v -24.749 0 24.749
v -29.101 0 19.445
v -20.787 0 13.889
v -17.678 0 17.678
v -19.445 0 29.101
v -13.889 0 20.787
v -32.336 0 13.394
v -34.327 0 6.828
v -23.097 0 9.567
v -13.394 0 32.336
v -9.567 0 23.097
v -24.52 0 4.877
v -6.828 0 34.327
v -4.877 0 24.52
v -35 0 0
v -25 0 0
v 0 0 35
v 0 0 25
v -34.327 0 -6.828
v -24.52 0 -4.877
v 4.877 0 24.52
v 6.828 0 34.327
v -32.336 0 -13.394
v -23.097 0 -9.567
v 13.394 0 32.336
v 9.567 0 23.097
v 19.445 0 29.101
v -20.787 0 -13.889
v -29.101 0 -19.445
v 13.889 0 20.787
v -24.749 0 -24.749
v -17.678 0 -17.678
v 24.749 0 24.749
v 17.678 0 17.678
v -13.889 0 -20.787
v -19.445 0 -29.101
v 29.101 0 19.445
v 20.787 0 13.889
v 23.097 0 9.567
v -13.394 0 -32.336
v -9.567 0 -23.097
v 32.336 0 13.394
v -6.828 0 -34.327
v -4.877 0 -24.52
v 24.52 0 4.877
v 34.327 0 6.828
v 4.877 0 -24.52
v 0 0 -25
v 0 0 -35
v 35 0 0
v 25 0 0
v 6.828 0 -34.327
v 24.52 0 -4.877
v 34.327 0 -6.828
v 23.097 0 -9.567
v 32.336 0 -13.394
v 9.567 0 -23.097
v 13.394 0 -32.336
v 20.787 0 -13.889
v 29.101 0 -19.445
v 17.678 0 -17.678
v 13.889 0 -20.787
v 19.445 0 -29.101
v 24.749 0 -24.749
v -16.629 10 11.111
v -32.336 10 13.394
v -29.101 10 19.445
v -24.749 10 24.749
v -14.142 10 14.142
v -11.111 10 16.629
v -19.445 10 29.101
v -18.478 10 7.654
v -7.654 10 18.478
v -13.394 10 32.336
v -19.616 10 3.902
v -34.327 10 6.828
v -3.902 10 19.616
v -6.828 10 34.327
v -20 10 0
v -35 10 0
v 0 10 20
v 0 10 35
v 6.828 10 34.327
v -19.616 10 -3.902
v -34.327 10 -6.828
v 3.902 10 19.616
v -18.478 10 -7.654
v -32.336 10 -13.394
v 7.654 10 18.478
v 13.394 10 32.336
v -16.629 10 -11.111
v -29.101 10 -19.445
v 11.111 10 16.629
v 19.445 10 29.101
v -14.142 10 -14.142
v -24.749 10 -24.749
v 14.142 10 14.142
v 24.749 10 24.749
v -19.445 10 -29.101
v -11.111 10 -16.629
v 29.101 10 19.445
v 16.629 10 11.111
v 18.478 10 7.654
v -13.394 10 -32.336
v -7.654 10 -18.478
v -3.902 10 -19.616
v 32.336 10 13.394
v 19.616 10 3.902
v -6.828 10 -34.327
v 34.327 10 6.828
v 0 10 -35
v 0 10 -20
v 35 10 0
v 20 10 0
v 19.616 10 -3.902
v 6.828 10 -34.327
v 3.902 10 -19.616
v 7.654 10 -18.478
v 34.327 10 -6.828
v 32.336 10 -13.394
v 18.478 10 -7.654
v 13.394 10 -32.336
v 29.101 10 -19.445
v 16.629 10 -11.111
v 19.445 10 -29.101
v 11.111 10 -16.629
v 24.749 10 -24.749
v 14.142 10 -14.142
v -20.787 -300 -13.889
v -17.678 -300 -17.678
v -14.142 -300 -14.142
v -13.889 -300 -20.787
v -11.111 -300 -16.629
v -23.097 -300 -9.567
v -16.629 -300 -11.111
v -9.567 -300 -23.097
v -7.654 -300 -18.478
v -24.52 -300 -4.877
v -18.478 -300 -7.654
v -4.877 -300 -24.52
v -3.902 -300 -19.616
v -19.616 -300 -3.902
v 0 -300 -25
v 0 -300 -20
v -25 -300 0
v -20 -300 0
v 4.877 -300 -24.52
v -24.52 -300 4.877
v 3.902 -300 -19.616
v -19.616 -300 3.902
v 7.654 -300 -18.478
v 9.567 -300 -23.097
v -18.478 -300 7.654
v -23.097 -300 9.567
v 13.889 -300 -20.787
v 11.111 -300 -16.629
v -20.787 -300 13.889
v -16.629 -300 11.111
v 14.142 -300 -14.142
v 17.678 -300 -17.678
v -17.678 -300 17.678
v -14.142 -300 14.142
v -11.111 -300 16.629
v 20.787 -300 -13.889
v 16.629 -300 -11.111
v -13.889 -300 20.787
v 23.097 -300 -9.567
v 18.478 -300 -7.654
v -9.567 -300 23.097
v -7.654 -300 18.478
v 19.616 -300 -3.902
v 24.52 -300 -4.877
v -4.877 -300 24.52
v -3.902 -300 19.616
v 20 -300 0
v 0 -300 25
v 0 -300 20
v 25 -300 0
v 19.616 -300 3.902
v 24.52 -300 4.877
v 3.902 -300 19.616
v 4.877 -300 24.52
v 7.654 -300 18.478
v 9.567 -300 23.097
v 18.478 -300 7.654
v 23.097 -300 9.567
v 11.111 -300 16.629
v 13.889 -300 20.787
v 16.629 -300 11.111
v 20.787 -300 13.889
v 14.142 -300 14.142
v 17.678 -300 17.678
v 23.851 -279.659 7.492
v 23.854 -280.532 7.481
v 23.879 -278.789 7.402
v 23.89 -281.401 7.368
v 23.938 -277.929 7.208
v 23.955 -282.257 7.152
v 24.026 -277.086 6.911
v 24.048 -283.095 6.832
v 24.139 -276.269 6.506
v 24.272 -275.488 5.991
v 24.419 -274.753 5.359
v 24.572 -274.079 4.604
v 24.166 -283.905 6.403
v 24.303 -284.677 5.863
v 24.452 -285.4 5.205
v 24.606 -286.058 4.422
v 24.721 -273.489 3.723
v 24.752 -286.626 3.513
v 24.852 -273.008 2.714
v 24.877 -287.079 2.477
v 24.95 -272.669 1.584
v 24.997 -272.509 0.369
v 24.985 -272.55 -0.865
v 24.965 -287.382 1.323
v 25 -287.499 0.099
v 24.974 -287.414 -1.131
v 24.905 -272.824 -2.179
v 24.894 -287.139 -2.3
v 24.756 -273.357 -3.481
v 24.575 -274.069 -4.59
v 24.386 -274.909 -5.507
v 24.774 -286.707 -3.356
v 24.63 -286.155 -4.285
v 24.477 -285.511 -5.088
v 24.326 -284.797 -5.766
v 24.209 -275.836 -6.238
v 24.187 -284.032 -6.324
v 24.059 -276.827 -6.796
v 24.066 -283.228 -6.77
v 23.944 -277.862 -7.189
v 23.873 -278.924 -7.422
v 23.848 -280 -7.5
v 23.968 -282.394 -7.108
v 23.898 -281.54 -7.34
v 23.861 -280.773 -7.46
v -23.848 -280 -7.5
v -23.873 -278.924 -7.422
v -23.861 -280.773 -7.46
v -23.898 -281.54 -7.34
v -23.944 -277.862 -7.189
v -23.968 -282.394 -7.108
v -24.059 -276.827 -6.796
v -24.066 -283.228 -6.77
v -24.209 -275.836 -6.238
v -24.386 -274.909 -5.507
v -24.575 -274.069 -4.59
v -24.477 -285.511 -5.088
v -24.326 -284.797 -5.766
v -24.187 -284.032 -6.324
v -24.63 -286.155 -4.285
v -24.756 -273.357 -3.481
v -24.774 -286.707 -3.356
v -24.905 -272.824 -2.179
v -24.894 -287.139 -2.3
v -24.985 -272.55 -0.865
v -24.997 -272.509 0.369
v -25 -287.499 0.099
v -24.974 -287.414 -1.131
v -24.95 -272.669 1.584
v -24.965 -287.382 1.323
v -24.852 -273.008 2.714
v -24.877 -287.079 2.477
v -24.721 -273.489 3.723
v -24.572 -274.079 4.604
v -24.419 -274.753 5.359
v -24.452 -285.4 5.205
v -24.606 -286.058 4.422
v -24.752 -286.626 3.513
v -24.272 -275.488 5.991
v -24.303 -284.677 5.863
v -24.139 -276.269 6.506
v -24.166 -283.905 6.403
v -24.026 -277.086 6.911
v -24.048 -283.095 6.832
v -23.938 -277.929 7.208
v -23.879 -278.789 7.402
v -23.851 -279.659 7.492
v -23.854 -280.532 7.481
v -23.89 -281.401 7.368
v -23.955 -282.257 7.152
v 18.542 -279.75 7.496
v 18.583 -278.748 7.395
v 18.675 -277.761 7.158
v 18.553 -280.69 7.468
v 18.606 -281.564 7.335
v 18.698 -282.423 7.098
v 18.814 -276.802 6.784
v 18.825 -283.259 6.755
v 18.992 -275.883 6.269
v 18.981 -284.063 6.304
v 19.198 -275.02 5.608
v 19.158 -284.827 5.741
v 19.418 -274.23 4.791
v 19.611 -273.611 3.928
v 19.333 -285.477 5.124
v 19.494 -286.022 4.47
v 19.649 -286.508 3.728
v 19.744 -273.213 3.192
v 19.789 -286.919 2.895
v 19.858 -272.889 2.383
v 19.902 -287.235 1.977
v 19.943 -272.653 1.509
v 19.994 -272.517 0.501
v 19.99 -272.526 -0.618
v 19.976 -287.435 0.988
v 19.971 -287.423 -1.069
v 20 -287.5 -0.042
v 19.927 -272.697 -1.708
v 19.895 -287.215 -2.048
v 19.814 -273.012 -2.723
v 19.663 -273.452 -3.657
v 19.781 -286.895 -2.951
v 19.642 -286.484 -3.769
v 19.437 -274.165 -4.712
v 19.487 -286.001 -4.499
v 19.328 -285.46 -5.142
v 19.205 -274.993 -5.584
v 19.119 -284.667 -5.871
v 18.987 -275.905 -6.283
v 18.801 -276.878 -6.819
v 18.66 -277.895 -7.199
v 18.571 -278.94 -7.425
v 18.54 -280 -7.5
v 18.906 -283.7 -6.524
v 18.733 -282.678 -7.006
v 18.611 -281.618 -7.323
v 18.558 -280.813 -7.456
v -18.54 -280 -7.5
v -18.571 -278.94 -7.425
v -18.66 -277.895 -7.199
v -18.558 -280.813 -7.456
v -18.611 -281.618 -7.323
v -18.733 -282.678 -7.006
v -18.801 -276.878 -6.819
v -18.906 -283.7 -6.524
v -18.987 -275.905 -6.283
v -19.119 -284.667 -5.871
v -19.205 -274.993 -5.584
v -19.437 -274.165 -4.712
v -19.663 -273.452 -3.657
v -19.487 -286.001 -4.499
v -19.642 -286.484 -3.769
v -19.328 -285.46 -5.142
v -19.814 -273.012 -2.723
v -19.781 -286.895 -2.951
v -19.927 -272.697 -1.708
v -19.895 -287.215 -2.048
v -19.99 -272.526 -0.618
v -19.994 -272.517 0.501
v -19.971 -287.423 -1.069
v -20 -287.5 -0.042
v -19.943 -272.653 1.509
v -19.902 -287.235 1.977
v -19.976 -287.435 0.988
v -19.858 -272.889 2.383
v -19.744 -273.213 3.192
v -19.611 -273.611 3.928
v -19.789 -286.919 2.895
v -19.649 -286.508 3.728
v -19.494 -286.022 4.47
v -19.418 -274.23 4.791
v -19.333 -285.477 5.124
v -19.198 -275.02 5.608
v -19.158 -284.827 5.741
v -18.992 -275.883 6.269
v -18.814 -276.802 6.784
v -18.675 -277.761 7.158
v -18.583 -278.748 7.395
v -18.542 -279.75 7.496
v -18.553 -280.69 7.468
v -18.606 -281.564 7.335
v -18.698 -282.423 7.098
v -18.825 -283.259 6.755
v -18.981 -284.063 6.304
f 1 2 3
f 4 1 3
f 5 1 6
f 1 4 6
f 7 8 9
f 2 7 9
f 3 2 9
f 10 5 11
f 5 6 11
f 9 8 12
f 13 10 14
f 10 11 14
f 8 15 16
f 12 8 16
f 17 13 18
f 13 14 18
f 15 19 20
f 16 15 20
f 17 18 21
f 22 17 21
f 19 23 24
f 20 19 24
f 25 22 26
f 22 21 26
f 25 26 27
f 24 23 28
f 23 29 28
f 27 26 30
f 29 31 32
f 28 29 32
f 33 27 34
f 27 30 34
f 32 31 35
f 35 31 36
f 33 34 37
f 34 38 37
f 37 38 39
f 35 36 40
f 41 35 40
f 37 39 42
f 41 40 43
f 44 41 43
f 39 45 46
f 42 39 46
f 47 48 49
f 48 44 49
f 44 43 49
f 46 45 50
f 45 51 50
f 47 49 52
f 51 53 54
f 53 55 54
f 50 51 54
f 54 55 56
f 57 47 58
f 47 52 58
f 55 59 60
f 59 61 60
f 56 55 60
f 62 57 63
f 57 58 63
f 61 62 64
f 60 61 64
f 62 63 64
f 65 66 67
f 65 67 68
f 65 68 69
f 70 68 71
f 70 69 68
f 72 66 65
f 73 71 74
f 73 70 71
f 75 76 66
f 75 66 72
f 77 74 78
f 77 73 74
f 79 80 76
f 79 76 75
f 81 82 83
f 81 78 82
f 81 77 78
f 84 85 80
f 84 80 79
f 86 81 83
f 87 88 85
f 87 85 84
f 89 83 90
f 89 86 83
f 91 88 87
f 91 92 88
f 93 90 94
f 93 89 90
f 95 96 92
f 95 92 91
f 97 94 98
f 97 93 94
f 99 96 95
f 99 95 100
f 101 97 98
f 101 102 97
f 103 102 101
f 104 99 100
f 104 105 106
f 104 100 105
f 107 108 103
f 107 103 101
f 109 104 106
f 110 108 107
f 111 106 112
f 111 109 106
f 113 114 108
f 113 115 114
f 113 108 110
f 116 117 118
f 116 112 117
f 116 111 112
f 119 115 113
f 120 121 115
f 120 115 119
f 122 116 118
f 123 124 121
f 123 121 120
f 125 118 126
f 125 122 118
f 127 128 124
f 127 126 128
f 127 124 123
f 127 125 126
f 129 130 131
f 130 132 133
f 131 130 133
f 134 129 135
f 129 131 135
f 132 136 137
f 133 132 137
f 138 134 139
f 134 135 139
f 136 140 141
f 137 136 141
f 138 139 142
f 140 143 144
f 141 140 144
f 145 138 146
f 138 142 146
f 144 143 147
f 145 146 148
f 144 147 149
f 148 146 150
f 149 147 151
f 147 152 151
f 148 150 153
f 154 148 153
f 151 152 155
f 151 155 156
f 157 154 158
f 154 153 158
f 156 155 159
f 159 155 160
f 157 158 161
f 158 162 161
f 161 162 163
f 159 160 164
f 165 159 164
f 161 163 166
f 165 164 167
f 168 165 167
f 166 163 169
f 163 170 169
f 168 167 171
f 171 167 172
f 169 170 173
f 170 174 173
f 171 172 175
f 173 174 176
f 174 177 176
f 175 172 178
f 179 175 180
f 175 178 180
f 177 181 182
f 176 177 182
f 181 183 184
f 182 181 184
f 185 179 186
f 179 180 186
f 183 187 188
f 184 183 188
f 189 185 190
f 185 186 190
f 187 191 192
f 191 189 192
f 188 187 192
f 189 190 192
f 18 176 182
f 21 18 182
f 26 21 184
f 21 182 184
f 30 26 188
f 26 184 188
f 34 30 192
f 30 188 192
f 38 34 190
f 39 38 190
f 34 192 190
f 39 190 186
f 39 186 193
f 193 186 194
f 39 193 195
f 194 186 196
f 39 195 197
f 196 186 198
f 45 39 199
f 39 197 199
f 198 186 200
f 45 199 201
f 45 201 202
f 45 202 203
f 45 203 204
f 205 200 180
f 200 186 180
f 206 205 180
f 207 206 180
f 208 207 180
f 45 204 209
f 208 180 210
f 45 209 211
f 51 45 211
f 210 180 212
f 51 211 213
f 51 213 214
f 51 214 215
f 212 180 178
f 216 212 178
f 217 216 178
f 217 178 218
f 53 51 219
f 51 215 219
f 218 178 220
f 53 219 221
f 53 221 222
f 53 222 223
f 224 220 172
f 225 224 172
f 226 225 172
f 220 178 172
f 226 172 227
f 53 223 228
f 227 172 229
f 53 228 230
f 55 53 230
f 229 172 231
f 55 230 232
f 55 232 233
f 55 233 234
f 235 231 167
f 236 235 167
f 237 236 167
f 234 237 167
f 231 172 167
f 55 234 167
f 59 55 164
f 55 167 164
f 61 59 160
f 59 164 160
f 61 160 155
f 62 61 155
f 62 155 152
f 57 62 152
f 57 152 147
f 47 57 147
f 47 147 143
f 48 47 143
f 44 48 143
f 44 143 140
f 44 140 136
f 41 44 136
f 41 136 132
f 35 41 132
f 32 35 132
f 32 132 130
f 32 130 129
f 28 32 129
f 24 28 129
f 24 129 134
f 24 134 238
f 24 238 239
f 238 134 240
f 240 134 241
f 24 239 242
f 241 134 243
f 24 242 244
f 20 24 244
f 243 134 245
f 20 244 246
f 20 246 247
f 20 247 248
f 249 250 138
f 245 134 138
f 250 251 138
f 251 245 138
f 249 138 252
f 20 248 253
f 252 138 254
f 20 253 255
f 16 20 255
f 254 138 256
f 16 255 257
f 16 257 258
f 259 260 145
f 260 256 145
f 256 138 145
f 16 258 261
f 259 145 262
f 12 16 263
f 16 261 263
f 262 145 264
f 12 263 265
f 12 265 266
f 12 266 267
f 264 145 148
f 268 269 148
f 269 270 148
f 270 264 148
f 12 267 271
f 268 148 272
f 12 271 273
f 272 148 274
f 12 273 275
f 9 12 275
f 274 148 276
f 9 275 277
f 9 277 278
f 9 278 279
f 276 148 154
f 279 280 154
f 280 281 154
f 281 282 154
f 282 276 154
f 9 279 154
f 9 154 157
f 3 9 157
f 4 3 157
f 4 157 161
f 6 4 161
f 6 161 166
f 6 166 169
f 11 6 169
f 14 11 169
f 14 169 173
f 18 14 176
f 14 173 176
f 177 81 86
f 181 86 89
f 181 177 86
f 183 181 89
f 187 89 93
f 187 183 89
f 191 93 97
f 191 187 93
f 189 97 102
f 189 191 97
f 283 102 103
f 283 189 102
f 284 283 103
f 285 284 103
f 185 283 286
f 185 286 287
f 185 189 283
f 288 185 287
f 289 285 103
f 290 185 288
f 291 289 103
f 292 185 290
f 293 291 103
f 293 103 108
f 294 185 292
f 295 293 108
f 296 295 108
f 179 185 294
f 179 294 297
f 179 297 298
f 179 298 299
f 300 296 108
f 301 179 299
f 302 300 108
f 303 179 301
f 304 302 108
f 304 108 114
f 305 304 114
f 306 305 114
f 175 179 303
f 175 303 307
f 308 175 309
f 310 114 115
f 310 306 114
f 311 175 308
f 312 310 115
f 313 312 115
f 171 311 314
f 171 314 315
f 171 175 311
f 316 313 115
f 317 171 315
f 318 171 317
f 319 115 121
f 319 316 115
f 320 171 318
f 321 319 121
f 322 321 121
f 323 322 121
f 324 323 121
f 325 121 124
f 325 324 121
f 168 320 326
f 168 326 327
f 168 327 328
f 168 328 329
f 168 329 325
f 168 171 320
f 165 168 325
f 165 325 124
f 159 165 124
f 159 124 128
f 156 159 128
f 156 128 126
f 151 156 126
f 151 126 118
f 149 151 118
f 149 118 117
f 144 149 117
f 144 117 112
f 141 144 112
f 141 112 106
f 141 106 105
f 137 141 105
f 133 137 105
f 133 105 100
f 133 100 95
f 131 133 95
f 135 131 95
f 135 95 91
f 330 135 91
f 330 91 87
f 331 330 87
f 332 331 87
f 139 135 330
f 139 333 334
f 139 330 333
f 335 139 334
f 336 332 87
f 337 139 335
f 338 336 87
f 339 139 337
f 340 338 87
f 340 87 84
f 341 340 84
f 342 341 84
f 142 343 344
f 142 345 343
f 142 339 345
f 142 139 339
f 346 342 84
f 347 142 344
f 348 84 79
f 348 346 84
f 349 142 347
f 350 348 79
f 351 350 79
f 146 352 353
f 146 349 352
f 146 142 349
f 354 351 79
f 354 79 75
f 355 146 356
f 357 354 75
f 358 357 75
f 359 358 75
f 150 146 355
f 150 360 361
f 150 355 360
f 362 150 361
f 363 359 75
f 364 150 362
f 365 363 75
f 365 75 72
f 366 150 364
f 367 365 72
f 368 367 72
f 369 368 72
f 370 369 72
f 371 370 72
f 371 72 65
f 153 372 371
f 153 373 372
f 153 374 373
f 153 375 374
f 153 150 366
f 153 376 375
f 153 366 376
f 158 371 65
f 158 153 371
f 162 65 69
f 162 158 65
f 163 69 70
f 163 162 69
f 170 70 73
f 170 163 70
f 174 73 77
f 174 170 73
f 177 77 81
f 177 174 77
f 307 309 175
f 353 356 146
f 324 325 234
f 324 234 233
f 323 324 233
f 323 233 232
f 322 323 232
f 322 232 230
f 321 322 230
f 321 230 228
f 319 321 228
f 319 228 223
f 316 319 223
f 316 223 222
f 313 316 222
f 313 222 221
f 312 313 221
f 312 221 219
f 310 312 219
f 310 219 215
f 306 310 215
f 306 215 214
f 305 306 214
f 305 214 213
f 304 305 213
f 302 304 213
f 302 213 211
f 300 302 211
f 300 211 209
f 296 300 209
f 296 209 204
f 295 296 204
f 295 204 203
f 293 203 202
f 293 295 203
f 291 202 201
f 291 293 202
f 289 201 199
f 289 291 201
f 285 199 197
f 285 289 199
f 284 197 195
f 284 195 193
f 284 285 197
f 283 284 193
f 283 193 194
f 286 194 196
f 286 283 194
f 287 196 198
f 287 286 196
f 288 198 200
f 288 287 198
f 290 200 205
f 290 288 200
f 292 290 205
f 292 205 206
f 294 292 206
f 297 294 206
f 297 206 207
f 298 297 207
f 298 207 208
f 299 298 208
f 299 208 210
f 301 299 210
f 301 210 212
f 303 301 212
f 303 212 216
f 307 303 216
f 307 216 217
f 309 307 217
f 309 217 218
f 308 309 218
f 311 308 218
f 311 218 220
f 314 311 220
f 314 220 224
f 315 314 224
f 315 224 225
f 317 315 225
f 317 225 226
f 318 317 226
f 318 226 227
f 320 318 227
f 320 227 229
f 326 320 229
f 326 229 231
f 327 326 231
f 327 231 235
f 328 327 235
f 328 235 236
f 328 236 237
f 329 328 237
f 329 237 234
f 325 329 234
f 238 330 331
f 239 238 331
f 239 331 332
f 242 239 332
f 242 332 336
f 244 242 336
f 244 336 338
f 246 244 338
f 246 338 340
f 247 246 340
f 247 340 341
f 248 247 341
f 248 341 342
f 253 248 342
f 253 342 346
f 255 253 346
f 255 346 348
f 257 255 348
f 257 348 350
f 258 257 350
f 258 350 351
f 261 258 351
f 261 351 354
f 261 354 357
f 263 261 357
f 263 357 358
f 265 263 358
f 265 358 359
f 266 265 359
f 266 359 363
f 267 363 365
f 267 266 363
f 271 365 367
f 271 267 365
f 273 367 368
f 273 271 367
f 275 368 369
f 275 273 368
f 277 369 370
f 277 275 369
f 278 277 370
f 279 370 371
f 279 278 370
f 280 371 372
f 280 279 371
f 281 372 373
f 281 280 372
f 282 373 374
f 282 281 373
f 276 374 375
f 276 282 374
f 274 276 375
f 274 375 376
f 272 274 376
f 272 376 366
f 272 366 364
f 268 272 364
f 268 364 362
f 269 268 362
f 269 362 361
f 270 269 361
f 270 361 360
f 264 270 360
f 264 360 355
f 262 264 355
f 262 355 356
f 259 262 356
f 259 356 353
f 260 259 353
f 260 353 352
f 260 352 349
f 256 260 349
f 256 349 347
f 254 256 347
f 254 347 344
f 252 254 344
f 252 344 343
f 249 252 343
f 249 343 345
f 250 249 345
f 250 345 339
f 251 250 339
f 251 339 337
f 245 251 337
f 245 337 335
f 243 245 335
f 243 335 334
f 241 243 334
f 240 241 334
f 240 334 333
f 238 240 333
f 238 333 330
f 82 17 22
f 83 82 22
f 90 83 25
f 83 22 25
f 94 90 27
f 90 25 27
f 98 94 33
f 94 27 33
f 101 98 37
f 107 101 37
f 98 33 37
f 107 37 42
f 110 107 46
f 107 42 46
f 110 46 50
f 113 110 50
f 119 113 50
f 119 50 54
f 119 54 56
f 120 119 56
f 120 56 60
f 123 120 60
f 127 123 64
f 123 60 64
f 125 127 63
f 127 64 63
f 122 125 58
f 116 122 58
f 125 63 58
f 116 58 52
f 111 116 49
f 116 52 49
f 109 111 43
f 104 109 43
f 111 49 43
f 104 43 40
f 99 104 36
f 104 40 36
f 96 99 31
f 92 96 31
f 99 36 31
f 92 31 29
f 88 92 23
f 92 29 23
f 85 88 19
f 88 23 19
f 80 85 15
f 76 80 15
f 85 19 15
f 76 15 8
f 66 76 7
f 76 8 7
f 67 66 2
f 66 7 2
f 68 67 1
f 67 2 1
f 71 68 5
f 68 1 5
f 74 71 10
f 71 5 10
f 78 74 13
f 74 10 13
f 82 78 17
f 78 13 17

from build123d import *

# Parameters (mm, degrees)
SKETCH1_R               = 35
SKETCH1_R_2             = 20
BOSS_EXTRUDE1_DEPTH     = 10
BOSS_EXTRUDE4_START     = -300
SKETCH1_6_R             = 25
SKETCH1_6_R_2           = 20
BOSS_EXTRUDE4_DEPTH     = 300
CUT_EXTRUDE2_DEPTH      = 305.05591591
CUT_EXTRUDE2_DEPTH_BACK = 305.05591591
SKETCH2_R               = 7.5


with BuildPart() as part:
    # Sketch1 → Boss-Extrude1 (new body)
    with BuildSketch(Plane(origin=(0, 0, 0), x_dir=(1, 0, 0), z_dir=(0, 1, 0))):
        Circle(SKETCH1_R)
        Circle(SKETCH1_R_2, mode=Mode.SUBTRACT)
    extrude(amount=BOSS_EXTRUDE1_DEPTH)

    # Sketch1<6> → Boss-Extrude4 (add)
    with BuildSketch(Plane(origin=(0, 0, 0), x_dir=(1, 0, 0), z_dir=(0, 1, 0)).offset(BOSS_EXTRUDE4_START)):
        Circle(SKETCH1_6_R)
        Circle(SKETCH1_6_R_2, mode=Mode.SUBTRACT)
    extrude(amount=BOSS_EXTRUDE4_DEPTH)

    # Sketch2 → Cut-Extrude2 (cut, two sides: drawn at the far end of the back side and taken through both)
    with BuildSketch(Plane(origin=(0, 0, 0), x_dir=(0, 0, -1), z_dir=(1, 0, 0)).offset(-CUT_EXTRUDE2_DEPTH_BACK)):
        with Locations((0, -280)):
            Circle(SKETCH2_R)
    extrude(amount=CUT_EXTRUDE2_DEPTH + CUT_EXTRUDE2_DEPTH_BACK, mode=Mode.SUBTRACT)


solid = part.part
